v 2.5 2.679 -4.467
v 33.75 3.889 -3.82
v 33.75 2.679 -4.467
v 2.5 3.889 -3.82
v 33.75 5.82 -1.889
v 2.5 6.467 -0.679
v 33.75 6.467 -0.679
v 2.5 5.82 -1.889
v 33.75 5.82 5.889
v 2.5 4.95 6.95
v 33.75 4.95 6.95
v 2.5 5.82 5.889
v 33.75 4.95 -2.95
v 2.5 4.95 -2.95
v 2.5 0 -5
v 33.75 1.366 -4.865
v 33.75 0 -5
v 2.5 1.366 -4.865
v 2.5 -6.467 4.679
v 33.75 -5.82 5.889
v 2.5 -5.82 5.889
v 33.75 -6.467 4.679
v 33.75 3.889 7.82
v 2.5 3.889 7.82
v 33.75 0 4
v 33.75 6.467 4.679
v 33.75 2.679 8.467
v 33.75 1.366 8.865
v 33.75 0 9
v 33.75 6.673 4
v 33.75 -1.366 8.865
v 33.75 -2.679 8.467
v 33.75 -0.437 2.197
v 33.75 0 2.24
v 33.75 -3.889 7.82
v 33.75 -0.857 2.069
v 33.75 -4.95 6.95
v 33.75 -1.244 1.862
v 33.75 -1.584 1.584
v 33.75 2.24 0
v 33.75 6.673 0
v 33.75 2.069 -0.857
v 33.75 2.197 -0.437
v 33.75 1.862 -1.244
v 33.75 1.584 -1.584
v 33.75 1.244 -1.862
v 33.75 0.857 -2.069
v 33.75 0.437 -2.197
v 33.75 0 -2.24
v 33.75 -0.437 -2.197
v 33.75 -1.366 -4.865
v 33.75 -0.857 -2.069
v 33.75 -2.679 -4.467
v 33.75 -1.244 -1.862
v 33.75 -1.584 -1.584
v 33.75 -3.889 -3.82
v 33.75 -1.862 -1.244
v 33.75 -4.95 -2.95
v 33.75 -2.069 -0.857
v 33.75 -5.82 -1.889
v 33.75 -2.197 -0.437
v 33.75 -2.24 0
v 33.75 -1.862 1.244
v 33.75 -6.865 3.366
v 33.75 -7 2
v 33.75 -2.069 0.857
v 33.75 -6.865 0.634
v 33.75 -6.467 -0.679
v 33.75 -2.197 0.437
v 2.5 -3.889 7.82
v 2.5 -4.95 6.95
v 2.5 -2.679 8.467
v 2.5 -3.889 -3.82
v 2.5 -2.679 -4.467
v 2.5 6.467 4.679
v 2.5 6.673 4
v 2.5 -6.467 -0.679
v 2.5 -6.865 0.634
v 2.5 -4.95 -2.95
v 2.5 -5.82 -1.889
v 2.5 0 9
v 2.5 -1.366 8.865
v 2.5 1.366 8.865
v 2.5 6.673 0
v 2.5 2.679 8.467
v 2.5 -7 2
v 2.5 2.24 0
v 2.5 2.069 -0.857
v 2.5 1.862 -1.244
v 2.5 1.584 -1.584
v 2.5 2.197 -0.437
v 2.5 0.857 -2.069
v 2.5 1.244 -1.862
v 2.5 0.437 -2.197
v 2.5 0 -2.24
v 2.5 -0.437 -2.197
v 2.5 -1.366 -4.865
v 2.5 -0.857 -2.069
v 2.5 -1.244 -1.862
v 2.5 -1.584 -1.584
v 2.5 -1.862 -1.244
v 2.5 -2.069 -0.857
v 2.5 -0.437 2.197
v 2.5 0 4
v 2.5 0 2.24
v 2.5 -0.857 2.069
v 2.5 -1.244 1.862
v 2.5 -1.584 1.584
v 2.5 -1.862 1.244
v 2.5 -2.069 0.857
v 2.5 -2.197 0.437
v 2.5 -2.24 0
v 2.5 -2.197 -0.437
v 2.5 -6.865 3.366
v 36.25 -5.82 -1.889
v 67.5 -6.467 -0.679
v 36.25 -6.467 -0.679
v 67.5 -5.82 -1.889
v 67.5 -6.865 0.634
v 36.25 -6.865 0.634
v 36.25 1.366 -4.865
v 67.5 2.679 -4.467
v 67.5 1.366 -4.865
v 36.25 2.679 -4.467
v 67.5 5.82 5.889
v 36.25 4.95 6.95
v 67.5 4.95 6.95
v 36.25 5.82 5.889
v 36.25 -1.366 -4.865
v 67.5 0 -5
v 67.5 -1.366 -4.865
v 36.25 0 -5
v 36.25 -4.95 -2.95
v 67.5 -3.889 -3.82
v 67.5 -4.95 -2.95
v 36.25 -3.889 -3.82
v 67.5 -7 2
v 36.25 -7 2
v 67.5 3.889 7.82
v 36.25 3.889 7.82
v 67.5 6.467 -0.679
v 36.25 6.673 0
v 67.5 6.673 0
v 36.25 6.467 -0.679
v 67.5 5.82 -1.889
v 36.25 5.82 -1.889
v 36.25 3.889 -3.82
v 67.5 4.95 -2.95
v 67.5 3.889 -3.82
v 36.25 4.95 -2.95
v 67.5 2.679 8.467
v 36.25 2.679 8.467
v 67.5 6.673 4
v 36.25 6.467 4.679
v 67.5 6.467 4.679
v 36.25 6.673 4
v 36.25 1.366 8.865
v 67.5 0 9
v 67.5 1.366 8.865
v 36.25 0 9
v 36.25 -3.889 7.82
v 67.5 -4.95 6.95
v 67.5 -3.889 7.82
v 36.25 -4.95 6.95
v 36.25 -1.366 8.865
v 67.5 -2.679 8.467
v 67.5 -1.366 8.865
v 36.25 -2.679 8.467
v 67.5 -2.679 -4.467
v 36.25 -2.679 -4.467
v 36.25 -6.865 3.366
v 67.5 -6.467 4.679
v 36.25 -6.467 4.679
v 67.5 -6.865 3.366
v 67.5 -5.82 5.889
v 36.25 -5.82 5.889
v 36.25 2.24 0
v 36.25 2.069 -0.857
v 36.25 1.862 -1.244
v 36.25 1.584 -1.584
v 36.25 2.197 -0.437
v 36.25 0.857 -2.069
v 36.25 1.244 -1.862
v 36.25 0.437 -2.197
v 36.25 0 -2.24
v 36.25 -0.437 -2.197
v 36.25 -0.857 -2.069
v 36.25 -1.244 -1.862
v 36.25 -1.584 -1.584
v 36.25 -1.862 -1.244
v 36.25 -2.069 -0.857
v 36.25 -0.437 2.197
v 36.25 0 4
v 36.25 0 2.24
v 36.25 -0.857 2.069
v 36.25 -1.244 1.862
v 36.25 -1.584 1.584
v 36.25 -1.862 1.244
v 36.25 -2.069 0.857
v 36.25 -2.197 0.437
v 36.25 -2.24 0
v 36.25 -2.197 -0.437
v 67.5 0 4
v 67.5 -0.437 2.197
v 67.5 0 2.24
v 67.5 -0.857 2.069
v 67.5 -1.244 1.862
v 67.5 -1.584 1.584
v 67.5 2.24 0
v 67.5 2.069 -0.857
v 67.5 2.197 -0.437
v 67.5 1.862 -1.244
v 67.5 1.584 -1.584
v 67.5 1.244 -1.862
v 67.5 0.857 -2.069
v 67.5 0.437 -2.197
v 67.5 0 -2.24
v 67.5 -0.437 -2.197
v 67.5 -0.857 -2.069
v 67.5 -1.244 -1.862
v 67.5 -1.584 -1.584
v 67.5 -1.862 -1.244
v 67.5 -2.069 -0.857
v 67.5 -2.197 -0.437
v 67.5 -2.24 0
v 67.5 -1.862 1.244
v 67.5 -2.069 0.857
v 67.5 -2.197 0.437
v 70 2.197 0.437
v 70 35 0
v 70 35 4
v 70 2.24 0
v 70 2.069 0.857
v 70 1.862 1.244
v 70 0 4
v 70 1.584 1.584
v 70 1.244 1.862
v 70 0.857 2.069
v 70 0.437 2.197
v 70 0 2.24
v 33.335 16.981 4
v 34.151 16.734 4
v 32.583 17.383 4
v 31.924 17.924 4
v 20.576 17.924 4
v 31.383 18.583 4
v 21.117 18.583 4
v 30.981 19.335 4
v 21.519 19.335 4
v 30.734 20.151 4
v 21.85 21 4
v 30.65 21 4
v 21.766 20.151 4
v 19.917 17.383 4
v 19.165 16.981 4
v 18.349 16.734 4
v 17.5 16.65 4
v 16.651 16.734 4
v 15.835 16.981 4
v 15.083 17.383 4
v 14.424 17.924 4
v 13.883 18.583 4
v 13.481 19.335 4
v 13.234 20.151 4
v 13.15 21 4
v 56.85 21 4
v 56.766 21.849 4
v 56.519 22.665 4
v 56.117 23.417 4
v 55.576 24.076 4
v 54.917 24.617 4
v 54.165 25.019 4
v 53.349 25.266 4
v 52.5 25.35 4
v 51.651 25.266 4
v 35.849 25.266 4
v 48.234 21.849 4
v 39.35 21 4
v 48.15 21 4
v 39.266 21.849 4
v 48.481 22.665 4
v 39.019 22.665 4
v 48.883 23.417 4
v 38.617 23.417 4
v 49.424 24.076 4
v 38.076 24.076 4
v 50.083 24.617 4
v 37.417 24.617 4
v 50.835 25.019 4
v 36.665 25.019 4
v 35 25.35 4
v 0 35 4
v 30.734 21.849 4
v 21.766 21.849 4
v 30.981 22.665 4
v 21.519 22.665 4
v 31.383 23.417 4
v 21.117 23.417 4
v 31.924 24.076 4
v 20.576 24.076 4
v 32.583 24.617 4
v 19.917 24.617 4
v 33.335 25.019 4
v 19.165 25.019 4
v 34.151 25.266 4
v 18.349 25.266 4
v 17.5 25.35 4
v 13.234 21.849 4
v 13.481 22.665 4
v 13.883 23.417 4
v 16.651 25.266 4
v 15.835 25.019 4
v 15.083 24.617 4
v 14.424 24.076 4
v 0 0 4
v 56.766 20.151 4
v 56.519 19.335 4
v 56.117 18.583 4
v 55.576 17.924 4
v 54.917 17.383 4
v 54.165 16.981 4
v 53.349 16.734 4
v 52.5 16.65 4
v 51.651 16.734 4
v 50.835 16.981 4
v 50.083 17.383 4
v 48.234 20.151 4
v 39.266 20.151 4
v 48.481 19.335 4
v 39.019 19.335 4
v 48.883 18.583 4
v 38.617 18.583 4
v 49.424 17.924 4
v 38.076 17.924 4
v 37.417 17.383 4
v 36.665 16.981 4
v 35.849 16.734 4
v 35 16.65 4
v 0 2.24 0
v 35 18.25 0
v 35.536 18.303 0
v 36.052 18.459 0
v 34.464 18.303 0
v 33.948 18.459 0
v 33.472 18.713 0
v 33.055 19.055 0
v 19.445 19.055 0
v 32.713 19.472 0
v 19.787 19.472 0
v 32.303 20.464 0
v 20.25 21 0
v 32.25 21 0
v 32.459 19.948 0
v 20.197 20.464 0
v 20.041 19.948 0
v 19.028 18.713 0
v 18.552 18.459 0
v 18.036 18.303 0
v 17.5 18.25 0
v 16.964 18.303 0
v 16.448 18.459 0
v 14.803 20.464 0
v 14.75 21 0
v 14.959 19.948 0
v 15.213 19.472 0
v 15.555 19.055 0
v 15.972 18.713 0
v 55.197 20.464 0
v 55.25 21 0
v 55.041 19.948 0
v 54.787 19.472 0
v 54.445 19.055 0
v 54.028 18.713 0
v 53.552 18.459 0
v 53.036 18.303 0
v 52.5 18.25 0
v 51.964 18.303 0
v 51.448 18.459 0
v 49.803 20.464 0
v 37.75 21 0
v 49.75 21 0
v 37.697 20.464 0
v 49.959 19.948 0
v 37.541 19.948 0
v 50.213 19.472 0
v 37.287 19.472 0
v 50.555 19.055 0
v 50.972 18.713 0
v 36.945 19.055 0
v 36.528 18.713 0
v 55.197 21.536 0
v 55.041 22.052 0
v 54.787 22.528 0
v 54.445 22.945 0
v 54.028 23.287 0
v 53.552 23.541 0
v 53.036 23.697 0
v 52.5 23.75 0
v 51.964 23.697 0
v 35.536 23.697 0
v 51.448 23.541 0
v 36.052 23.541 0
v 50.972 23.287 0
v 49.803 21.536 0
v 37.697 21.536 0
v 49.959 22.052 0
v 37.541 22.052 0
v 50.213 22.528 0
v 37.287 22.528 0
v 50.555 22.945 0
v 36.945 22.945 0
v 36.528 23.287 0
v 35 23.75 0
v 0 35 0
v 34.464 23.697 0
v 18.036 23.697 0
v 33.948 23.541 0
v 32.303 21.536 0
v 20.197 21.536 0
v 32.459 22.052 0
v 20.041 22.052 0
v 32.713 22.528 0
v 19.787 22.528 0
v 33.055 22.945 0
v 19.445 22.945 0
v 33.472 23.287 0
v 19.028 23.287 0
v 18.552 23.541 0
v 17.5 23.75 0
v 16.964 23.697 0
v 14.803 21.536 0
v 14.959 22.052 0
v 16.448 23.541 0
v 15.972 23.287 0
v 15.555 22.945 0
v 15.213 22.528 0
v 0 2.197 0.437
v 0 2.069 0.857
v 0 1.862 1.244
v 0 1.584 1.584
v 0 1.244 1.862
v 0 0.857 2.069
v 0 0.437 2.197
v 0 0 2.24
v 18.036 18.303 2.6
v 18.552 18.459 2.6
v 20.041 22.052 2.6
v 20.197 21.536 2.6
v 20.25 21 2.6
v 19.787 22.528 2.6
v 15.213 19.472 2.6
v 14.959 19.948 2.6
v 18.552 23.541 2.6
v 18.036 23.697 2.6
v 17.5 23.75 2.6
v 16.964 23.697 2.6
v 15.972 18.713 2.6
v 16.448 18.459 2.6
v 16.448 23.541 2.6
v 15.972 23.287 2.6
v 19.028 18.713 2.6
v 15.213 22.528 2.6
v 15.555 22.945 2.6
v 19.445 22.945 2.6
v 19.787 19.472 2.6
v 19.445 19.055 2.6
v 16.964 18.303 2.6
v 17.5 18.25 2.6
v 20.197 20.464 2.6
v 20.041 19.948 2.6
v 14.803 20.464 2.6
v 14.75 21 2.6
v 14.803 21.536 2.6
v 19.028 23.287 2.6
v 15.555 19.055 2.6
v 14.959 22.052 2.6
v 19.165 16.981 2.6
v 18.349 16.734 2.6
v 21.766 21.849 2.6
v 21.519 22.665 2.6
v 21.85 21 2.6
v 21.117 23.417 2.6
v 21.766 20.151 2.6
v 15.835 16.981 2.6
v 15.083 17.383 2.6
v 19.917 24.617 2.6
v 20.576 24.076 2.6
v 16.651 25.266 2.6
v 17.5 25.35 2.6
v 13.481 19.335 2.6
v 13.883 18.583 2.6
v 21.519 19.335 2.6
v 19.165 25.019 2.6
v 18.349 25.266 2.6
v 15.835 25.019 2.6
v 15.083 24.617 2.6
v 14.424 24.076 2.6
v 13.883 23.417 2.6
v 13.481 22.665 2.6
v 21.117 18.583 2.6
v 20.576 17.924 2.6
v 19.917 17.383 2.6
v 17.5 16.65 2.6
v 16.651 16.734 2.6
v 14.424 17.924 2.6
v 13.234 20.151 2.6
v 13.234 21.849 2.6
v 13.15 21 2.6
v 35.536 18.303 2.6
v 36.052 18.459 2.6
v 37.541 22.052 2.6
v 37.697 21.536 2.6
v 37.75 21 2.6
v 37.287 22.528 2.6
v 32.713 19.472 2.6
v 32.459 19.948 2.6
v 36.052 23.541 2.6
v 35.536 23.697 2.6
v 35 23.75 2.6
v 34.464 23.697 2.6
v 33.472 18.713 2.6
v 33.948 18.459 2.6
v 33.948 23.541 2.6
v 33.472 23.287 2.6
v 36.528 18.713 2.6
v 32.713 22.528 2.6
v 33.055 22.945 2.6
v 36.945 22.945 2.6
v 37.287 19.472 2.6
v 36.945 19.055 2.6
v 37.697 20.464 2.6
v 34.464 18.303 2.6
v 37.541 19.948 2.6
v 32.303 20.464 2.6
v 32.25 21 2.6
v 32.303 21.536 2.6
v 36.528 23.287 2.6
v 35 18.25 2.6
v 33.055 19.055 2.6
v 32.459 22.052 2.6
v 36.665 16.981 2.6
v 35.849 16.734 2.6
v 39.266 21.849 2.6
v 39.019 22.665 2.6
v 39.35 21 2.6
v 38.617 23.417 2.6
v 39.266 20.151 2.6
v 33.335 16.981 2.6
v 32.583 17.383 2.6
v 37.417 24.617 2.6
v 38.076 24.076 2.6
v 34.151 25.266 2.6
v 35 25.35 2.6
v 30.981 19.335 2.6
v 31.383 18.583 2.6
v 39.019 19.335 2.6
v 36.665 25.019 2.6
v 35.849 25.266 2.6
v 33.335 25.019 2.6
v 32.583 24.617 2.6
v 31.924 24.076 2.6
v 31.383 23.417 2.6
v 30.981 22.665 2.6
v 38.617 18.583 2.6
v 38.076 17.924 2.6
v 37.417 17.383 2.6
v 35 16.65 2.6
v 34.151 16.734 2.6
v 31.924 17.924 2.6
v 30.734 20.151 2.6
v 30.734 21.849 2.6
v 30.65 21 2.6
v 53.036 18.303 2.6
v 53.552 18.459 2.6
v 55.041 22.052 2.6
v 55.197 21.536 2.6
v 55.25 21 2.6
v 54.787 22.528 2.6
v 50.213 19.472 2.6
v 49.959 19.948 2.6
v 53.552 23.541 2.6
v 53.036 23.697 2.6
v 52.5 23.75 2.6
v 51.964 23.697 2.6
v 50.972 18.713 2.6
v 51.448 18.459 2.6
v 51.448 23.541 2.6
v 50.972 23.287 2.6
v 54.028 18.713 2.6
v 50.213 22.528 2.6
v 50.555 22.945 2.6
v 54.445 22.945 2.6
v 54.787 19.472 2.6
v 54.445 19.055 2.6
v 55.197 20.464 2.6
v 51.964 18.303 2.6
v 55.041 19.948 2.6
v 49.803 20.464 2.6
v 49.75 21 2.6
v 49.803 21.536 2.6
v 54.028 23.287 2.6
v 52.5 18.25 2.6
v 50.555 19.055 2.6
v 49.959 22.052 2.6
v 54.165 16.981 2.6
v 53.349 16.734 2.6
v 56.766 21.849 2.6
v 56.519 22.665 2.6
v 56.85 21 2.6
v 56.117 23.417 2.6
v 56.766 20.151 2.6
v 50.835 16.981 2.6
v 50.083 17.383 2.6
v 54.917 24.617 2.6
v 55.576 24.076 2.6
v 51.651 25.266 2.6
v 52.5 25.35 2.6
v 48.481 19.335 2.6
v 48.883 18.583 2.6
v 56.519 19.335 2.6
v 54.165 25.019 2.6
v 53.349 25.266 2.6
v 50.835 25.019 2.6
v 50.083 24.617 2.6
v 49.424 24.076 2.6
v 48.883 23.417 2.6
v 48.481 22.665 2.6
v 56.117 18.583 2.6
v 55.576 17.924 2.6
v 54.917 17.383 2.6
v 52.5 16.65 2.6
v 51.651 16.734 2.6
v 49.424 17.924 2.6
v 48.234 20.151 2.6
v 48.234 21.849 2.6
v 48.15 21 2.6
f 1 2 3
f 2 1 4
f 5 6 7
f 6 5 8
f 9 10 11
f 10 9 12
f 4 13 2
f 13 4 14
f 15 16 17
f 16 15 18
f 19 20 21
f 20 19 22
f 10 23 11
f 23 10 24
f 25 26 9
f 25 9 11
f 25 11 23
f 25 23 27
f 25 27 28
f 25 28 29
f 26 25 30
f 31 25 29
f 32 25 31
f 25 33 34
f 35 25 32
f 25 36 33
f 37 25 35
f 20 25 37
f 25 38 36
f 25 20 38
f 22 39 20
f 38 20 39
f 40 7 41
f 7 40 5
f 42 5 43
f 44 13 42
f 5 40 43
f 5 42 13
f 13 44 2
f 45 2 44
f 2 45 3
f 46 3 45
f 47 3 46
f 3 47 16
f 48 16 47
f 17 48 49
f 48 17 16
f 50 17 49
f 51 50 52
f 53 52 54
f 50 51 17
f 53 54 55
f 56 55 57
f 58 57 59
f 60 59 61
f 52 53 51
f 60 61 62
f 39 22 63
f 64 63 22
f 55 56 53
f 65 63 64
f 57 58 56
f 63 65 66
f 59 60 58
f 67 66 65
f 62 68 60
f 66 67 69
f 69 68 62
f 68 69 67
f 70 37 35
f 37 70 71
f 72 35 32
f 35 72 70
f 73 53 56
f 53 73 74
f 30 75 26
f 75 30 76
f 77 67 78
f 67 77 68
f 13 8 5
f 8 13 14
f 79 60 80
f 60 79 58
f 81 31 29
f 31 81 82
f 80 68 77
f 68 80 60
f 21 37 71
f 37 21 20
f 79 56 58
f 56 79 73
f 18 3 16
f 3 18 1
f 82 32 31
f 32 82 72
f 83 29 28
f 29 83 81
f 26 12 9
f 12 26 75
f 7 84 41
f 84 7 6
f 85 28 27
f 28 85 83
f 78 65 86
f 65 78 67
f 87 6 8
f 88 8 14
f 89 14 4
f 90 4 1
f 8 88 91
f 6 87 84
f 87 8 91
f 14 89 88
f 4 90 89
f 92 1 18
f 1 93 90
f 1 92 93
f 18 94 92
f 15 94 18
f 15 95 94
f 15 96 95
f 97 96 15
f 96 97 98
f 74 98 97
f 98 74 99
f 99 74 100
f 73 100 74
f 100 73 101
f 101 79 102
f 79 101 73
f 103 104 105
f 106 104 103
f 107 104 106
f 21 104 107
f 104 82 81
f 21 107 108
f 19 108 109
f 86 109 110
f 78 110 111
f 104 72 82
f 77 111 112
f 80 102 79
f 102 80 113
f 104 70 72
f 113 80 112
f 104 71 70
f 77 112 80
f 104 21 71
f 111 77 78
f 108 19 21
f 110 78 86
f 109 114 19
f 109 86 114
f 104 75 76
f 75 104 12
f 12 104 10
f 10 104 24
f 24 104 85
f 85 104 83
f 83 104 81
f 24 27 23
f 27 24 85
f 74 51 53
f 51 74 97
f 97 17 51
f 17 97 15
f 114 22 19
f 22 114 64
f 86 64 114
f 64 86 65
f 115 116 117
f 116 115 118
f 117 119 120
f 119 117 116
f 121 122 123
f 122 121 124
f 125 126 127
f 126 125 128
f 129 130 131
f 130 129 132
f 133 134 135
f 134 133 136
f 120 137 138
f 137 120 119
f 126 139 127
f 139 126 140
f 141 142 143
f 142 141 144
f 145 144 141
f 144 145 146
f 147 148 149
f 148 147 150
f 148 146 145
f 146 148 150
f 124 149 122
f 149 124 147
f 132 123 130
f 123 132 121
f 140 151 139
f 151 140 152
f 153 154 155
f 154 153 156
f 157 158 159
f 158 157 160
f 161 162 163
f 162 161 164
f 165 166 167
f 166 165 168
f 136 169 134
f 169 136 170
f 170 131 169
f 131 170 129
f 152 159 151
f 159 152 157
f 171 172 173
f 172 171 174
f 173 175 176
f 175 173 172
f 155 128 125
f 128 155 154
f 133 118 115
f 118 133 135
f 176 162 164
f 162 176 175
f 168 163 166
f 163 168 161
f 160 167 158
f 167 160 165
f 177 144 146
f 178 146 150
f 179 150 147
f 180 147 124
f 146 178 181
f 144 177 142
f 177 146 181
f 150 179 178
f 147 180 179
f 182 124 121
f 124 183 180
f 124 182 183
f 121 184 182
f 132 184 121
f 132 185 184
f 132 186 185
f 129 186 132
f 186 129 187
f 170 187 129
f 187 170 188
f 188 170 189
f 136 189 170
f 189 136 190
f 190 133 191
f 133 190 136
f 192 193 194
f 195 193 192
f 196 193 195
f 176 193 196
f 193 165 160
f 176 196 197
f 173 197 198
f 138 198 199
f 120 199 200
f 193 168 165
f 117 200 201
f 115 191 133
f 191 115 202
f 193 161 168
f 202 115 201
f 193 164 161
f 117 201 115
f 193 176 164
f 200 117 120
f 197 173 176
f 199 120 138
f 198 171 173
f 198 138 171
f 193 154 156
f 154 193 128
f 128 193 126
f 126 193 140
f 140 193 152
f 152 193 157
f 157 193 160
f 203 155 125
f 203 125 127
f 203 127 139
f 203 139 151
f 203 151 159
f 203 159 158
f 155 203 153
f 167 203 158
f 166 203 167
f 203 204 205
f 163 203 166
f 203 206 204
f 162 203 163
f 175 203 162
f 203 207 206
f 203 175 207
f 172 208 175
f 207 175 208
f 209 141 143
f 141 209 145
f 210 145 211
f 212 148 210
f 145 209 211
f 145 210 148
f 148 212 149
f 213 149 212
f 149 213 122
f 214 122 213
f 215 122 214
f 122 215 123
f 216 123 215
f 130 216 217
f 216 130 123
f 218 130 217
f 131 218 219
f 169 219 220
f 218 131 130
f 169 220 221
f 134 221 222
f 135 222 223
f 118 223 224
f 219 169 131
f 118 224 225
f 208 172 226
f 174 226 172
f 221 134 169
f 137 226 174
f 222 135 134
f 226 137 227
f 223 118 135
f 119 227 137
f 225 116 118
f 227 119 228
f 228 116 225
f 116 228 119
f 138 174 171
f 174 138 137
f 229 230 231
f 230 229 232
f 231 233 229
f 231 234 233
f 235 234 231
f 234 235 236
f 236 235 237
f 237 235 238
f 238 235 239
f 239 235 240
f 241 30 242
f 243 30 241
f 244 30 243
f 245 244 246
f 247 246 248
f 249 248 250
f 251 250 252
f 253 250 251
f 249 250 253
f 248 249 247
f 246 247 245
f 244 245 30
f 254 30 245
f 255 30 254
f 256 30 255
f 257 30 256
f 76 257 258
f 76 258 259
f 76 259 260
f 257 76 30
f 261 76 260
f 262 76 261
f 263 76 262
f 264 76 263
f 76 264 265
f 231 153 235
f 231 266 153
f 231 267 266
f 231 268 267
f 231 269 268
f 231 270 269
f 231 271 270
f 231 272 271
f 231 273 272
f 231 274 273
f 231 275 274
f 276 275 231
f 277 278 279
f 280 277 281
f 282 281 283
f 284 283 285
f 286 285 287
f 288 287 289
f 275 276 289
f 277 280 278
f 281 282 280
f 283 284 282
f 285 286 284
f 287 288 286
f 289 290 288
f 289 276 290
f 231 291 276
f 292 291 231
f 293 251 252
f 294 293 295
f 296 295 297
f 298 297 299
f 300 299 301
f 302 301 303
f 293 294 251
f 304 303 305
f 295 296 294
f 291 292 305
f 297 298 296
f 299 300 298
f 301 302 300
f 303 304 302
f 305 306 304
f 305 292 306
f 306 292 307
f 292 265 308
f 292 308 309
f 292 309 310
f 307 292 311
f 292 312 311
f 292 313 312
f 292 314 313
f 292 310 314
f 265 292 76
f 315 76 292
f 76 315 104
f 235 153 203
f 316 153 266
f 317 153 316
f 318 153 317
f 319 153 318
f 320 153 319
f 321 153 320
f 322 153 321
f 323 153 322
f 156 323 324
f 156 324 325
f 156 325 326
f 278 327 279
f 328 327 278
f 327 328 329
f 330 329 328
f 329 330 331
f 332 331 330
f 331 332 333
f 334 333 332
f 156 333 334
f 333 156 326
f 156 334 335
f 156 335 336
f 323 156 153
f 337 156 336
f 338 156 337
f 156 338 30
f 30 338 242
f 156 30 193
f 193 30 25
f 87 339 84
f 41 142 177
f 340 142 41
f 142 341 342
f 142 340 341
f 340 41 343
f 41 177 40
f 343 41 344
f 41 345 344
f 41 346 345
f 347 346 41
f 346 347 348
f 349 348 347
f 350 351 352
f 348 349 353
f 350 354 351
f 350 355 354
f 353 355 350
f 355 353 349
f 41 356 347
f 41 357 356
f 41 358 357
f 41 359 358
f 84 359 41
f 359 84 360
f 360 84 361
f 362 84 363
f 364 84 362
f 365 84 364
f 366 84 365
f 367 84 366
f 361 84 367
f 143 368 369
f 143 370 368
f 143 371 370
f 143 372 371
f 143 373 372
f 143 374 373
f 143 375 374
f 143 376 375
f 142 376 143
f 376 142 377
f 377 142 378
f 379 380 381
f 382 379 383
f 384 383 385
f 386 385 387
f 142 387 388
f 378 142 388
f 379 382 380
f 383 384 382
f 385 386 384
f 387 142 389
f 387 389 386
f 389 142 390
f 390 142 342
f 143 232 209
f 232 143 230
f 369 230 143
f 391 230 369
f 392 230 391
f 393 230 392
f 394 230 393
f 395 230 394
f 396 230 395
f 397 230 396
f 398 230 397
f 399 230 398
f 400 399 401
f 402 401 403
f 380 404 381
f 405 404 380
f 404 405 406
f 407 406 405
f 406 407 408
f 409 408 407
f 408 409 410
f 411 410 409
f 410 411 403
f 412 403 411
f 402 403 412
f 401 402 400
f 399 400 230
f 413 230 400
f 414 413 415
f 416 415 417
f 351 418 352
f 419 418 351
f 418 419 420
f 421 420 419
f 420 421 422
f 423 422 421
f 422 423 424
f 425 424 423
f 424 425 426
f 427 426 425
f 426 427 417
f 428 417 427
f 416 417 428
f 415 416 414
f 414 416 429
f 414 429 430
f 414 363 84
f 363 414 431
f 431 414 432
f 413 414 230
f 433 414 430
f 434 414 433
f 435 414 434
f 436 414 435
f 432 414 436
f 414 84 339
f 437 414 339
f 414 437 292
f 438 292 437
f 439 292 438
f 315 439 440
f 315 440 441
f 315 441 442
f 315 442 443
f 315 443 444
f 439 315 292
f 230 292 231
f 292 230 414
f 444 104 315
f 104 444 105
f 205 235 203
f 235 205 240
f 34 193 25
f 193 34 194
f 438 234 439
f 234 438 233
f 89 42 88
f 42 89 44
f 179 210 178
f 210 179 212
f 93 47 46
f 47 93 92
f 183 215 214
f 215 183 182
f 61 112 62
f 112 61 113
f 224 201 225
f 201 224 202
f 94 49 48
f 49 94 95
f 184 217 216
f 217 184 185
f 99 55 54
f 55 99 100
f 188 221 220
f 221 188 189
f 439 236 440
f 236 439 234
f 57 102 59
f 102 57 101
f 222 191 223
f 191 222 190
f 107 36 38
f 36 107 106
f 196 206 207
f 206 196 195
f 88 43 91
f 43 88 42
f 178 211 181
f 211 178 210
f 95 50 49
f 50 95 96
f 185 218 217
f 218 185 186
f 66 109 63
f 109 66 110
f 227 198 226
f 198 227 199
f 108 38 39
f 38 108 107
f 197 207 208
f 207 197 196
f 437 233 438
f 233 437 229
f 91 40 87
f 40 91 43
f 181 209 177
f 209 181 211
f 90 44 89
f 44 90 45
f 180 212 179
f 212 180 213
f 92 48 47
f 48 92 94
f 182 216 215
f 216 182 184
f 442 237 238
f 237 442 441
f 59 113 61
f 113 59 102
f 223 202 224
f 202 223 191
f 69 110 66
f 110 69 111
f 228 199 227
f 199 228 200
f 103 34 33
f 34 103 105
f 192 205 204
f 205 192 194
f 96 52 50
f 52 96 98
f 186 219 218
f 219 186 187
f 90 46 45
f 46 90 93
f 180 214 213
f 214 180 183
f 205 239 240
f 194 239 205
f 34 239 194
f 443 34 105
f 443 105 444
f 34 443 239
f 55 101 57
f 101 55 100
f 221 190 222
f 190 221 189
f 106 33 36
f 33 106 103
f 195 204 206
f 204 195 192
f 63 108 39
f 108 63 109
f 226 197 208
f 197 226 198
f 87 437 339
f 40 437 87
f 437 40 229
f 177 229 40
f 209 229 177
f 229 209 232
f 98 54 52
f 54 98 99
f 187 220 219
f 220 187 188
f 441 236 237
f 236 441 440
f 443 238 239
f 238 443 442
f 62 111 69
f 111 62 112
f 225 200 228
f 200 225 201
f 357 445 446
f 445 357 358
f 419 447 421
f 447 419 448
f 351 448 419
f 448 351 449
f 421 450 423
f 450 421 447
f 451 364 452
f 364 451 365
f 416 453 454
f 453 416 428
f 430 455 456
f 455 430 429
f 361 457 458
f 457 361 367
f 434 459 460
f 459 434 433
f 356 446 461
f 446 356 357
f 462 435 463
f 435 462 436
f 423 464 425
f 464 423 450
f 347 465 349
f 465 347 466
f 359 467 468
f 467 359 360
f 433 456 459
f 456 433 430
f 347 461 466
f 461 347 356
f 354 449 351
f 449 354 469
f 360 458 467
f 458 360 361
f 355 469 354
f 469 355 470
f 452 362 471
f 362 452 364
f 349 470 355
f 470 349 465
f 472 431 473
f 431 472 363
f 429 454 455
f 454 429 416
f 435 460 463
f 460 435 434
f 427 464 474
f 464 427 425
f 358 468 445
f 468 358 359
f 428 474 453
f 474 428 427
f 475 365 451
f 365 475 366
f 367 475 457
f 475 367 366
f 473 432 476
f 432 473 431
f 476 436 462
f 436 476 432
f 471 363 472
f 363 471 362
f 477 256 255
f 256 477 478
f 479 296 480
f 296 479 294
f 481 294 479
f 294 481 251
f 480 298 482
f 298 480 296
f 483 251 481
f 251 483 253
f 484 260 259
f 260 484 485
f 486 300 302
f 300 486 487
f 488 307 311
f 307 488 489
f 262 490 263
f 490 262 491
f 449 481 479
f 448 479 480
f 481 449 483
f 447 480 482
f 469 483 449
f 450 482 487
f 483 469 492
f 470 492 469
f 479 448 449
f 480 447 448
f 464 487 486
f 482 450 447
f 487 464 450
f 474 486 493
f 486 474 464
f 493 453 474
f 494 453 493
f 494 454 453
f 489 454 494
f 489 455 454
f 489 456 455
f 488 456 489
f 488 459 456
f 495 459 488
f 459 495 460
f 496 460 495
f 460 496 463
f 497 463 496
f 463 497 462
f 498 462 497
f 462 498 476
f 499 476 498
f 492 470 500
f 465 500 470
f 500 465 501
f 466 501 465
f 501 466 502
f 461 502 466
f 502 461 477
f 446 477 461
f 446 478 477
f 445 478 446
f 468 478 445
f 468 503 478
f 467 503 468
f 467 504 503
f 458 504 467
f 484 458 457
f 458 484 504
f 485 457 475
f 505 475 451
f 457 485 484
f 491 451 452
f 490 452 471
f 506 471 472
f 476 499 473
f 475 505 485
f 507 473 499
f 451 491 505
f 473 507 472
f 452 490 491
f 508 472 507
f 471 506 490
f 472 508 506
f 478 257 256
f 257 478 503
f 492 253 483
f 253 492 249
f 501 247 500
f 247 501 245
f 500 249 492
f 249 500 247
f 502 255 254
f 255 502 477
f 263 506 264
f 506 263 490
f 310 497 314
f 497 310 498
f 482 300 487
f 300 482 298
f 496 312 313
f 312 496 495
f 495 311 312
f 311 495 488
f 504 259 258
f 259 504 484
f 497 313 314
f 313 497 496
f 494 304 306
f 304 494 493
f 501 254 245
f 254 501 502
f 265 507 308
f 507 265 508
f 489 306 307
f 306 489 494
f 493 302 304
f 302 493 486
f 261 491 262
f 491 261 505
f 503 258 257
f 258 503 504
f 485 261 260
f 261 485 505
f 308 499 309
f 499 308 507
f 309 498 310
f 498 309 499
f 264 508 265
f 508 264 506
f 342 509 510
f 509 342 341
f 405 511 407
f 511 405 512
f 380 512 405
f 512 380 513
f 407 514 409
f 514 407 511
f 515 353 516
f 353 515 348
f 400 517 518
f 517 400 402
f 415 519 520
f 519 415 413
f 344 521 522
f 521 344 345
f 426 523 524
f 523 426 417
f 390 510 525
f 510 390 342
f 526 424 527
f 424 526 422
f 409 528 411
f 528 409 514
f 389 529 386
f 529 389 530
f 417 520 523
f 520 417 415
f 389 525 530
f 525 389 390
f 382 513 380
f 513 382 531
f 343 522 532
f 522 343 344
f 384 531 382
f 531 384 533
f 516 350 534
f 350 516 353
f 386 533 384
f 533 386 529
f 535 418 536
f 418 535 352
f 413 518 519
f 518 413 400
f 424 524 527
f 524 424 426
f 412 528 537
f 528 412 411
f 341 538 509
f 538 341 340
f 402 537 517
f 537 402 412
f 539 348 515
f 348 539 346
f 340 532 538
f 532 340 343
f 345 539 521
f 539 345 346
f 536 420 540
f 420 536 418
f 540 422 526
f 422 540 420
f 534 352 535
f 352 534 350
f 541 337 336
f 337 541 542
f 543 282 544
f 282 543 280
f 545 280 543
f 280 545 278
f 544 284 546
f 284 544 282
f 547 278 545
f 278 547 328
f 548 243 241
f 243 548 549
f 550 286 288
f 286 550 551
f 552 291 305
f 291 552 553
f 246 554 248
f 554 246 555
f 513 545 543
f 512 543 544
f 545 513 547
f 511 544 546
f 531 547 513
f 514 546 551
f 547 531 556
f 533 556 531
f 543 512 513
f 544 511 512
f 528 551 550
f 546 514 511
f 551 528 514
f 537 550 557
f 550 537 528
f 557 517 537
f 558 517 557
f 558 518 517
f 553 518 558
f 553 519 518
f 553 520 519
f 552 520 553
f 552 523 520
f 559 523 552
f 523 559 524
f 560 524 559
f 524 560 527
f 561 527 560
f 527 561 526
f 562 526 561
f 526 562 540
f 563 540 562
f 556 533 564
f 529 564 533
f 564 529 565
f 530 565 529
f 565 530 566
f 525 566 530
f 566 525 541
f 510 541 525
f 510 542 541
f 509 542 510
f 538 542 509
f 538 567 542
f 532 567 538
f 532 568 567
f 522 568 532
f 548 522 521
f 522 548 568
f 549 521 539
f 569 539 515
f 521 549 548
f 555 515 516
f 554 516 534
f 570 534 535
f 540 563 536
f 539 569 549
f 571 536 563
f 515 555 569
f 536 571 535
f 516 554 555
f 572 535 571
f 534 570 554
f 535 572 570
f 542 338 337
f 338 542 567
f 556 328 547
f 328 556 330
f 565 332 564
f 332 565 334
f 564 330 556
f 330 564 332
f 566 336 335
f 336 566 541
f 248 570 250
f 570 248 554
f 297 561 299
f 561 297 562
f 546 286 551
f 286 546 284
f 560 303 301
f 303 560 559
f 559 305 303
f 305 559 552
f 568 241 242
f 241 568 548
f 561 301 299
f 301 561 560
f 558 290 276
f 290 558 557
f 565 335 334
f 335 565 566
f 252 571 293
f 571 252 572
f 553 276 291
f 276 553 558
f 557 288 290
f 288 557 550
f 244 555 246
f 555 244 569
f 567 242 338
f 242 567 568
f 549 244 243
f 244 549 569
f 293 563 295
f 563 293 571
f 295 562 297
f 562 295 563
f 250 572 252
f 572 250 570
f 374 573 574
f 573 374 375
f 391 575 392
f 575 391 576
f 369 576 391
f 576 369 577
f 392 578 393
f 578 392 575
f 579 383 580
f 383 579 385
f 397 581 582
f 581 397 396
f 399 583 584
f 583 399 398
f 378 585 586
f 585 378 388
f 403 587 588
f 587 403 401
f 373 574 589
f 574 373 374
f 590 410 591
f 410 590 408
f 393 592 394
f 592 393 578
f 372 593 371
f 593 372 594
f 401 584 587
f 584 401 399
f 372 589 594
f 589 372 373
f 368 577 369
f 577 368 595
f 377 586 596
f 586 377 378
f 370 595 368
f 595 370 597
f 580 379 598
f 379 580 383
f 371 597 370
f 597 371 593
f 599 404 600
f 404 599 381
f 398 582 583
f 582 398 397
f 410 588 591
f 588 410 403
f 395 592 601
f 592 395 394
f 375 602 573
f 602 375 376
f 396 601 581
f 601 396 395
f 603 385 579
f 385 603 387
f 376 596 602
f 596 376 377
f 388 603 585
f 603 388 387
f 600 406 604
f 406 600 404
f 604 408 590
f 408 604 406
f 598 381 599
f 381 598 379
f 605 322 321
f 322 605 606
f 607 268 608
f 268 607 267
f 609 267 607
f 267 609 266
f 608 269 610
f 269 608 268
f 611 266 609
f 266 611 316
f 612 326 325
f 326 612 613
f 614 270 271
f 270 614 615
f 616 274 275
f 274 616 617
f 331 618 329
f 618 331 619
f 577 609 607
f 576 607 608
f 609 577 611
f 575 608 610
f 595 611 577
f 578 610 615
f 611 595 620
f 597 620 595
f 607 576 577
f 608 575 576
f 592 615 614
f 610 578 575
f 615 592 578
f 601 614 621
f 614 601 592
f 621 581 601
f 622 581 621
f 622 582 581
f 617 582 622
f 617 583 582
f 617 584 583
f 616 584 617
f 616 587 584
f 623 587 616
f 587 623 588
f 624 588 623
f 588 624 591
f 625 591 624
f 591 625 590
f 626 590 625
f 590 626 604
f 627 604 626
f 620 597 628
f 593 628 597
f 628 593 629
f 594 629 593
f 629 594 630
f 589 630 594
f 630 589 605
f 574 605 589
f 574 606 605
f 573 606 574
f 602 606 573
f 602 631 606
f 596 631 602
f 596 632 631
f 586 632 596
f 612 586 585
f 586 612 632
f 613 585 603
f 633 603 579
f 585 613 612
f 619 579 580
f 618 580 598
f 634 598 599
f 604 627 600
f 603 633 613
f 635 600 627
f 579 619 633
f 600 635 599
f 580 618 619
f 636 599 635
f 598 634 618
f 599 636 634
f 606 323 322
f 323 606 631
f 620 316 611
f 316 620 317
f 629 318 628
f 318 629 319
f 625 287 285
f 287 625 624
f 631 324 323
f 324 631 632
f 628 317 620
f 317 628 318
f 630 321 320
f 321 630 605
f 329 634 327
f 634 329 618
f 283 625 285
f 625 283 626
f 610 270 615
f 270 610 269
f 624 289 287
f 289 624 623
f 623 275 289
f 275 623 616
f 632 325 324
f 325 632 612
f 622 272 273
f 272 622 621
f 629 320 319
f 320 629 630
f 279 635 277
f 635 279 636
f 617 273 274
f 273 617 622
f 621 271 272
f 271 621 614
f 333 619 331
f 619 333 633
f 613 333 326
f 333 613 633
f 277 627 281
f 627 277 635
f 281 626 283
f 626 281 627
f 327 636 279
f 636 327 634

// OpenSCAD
$fn = 32;

// ----------------------------------------------------------------------
// Hinge leaf: 70 x 42 x 14 mm
// ----------------------------------------------------------------------

// --- parameters (mm) ---
tab_len = 70;             // leaf length, X
tab_w = 35;               // leaf width, Y
tab_t = 4;                // leaf thickness
ring_d = 14;              // knuckle diameter
ring_w = 31.25;           // knuckle width
knuckle_n = 2;            // number of knuckles
pin_d = 4.48;             // pin bore
gap = 2.5;                // gap between the knuckles
screw_d = 5.5;            // screw clearance
cs_d = 8.7;               // countersink diameter
cs_h = 1.4;               // countersink depth

module leaf() {
  cube([tab_len, tab_w, tab_t]);
}

module knuckles() {
  /* barrels sit on the leaf edge, the pin axis at half the leaf thickness */
  for (i = [0 : knuckle_n - 1])
    translate([gap + i * (ring_w + gap), 0, tab_t * 0.5])
      rotate([0, 90, 0]) cylinder(h = ring_w, d = ring_d);
}

difference() {
  union() {
    leaf();
    knuckles();
  }
  rotate([0, 90, 0]) translate([0, 0, -1])
    cylinder(h = tab_len + 2, d = pin_d);
  translate([17.5, tab_w * 0.6, -1]) cylinder(h = tab_t + 2, d = screw_d);
  translate([17.5, tab_w * 0.6, tab_t - cs_h]) cylinder(h = cs_h + 0.5, d = cs_d);
  translate([35, tab_w * 0.6, -1]) cylinder(h = tab_t + 2, d = screw_d);
  translate([35, tab_w * 0.6, tab_t - cs_h]) cylinder(h = cs_h + 0.5, d = cs_d);
  translate([52.5, tab_w * 0.6, -1]) cylinder(h = tab_t + 2, d = screw_d);
  translate([52.5, tab_w * 0.6, tab_t - cs_h]) cylinder(h = cs_h + 0.5, d = cs_d);
}
